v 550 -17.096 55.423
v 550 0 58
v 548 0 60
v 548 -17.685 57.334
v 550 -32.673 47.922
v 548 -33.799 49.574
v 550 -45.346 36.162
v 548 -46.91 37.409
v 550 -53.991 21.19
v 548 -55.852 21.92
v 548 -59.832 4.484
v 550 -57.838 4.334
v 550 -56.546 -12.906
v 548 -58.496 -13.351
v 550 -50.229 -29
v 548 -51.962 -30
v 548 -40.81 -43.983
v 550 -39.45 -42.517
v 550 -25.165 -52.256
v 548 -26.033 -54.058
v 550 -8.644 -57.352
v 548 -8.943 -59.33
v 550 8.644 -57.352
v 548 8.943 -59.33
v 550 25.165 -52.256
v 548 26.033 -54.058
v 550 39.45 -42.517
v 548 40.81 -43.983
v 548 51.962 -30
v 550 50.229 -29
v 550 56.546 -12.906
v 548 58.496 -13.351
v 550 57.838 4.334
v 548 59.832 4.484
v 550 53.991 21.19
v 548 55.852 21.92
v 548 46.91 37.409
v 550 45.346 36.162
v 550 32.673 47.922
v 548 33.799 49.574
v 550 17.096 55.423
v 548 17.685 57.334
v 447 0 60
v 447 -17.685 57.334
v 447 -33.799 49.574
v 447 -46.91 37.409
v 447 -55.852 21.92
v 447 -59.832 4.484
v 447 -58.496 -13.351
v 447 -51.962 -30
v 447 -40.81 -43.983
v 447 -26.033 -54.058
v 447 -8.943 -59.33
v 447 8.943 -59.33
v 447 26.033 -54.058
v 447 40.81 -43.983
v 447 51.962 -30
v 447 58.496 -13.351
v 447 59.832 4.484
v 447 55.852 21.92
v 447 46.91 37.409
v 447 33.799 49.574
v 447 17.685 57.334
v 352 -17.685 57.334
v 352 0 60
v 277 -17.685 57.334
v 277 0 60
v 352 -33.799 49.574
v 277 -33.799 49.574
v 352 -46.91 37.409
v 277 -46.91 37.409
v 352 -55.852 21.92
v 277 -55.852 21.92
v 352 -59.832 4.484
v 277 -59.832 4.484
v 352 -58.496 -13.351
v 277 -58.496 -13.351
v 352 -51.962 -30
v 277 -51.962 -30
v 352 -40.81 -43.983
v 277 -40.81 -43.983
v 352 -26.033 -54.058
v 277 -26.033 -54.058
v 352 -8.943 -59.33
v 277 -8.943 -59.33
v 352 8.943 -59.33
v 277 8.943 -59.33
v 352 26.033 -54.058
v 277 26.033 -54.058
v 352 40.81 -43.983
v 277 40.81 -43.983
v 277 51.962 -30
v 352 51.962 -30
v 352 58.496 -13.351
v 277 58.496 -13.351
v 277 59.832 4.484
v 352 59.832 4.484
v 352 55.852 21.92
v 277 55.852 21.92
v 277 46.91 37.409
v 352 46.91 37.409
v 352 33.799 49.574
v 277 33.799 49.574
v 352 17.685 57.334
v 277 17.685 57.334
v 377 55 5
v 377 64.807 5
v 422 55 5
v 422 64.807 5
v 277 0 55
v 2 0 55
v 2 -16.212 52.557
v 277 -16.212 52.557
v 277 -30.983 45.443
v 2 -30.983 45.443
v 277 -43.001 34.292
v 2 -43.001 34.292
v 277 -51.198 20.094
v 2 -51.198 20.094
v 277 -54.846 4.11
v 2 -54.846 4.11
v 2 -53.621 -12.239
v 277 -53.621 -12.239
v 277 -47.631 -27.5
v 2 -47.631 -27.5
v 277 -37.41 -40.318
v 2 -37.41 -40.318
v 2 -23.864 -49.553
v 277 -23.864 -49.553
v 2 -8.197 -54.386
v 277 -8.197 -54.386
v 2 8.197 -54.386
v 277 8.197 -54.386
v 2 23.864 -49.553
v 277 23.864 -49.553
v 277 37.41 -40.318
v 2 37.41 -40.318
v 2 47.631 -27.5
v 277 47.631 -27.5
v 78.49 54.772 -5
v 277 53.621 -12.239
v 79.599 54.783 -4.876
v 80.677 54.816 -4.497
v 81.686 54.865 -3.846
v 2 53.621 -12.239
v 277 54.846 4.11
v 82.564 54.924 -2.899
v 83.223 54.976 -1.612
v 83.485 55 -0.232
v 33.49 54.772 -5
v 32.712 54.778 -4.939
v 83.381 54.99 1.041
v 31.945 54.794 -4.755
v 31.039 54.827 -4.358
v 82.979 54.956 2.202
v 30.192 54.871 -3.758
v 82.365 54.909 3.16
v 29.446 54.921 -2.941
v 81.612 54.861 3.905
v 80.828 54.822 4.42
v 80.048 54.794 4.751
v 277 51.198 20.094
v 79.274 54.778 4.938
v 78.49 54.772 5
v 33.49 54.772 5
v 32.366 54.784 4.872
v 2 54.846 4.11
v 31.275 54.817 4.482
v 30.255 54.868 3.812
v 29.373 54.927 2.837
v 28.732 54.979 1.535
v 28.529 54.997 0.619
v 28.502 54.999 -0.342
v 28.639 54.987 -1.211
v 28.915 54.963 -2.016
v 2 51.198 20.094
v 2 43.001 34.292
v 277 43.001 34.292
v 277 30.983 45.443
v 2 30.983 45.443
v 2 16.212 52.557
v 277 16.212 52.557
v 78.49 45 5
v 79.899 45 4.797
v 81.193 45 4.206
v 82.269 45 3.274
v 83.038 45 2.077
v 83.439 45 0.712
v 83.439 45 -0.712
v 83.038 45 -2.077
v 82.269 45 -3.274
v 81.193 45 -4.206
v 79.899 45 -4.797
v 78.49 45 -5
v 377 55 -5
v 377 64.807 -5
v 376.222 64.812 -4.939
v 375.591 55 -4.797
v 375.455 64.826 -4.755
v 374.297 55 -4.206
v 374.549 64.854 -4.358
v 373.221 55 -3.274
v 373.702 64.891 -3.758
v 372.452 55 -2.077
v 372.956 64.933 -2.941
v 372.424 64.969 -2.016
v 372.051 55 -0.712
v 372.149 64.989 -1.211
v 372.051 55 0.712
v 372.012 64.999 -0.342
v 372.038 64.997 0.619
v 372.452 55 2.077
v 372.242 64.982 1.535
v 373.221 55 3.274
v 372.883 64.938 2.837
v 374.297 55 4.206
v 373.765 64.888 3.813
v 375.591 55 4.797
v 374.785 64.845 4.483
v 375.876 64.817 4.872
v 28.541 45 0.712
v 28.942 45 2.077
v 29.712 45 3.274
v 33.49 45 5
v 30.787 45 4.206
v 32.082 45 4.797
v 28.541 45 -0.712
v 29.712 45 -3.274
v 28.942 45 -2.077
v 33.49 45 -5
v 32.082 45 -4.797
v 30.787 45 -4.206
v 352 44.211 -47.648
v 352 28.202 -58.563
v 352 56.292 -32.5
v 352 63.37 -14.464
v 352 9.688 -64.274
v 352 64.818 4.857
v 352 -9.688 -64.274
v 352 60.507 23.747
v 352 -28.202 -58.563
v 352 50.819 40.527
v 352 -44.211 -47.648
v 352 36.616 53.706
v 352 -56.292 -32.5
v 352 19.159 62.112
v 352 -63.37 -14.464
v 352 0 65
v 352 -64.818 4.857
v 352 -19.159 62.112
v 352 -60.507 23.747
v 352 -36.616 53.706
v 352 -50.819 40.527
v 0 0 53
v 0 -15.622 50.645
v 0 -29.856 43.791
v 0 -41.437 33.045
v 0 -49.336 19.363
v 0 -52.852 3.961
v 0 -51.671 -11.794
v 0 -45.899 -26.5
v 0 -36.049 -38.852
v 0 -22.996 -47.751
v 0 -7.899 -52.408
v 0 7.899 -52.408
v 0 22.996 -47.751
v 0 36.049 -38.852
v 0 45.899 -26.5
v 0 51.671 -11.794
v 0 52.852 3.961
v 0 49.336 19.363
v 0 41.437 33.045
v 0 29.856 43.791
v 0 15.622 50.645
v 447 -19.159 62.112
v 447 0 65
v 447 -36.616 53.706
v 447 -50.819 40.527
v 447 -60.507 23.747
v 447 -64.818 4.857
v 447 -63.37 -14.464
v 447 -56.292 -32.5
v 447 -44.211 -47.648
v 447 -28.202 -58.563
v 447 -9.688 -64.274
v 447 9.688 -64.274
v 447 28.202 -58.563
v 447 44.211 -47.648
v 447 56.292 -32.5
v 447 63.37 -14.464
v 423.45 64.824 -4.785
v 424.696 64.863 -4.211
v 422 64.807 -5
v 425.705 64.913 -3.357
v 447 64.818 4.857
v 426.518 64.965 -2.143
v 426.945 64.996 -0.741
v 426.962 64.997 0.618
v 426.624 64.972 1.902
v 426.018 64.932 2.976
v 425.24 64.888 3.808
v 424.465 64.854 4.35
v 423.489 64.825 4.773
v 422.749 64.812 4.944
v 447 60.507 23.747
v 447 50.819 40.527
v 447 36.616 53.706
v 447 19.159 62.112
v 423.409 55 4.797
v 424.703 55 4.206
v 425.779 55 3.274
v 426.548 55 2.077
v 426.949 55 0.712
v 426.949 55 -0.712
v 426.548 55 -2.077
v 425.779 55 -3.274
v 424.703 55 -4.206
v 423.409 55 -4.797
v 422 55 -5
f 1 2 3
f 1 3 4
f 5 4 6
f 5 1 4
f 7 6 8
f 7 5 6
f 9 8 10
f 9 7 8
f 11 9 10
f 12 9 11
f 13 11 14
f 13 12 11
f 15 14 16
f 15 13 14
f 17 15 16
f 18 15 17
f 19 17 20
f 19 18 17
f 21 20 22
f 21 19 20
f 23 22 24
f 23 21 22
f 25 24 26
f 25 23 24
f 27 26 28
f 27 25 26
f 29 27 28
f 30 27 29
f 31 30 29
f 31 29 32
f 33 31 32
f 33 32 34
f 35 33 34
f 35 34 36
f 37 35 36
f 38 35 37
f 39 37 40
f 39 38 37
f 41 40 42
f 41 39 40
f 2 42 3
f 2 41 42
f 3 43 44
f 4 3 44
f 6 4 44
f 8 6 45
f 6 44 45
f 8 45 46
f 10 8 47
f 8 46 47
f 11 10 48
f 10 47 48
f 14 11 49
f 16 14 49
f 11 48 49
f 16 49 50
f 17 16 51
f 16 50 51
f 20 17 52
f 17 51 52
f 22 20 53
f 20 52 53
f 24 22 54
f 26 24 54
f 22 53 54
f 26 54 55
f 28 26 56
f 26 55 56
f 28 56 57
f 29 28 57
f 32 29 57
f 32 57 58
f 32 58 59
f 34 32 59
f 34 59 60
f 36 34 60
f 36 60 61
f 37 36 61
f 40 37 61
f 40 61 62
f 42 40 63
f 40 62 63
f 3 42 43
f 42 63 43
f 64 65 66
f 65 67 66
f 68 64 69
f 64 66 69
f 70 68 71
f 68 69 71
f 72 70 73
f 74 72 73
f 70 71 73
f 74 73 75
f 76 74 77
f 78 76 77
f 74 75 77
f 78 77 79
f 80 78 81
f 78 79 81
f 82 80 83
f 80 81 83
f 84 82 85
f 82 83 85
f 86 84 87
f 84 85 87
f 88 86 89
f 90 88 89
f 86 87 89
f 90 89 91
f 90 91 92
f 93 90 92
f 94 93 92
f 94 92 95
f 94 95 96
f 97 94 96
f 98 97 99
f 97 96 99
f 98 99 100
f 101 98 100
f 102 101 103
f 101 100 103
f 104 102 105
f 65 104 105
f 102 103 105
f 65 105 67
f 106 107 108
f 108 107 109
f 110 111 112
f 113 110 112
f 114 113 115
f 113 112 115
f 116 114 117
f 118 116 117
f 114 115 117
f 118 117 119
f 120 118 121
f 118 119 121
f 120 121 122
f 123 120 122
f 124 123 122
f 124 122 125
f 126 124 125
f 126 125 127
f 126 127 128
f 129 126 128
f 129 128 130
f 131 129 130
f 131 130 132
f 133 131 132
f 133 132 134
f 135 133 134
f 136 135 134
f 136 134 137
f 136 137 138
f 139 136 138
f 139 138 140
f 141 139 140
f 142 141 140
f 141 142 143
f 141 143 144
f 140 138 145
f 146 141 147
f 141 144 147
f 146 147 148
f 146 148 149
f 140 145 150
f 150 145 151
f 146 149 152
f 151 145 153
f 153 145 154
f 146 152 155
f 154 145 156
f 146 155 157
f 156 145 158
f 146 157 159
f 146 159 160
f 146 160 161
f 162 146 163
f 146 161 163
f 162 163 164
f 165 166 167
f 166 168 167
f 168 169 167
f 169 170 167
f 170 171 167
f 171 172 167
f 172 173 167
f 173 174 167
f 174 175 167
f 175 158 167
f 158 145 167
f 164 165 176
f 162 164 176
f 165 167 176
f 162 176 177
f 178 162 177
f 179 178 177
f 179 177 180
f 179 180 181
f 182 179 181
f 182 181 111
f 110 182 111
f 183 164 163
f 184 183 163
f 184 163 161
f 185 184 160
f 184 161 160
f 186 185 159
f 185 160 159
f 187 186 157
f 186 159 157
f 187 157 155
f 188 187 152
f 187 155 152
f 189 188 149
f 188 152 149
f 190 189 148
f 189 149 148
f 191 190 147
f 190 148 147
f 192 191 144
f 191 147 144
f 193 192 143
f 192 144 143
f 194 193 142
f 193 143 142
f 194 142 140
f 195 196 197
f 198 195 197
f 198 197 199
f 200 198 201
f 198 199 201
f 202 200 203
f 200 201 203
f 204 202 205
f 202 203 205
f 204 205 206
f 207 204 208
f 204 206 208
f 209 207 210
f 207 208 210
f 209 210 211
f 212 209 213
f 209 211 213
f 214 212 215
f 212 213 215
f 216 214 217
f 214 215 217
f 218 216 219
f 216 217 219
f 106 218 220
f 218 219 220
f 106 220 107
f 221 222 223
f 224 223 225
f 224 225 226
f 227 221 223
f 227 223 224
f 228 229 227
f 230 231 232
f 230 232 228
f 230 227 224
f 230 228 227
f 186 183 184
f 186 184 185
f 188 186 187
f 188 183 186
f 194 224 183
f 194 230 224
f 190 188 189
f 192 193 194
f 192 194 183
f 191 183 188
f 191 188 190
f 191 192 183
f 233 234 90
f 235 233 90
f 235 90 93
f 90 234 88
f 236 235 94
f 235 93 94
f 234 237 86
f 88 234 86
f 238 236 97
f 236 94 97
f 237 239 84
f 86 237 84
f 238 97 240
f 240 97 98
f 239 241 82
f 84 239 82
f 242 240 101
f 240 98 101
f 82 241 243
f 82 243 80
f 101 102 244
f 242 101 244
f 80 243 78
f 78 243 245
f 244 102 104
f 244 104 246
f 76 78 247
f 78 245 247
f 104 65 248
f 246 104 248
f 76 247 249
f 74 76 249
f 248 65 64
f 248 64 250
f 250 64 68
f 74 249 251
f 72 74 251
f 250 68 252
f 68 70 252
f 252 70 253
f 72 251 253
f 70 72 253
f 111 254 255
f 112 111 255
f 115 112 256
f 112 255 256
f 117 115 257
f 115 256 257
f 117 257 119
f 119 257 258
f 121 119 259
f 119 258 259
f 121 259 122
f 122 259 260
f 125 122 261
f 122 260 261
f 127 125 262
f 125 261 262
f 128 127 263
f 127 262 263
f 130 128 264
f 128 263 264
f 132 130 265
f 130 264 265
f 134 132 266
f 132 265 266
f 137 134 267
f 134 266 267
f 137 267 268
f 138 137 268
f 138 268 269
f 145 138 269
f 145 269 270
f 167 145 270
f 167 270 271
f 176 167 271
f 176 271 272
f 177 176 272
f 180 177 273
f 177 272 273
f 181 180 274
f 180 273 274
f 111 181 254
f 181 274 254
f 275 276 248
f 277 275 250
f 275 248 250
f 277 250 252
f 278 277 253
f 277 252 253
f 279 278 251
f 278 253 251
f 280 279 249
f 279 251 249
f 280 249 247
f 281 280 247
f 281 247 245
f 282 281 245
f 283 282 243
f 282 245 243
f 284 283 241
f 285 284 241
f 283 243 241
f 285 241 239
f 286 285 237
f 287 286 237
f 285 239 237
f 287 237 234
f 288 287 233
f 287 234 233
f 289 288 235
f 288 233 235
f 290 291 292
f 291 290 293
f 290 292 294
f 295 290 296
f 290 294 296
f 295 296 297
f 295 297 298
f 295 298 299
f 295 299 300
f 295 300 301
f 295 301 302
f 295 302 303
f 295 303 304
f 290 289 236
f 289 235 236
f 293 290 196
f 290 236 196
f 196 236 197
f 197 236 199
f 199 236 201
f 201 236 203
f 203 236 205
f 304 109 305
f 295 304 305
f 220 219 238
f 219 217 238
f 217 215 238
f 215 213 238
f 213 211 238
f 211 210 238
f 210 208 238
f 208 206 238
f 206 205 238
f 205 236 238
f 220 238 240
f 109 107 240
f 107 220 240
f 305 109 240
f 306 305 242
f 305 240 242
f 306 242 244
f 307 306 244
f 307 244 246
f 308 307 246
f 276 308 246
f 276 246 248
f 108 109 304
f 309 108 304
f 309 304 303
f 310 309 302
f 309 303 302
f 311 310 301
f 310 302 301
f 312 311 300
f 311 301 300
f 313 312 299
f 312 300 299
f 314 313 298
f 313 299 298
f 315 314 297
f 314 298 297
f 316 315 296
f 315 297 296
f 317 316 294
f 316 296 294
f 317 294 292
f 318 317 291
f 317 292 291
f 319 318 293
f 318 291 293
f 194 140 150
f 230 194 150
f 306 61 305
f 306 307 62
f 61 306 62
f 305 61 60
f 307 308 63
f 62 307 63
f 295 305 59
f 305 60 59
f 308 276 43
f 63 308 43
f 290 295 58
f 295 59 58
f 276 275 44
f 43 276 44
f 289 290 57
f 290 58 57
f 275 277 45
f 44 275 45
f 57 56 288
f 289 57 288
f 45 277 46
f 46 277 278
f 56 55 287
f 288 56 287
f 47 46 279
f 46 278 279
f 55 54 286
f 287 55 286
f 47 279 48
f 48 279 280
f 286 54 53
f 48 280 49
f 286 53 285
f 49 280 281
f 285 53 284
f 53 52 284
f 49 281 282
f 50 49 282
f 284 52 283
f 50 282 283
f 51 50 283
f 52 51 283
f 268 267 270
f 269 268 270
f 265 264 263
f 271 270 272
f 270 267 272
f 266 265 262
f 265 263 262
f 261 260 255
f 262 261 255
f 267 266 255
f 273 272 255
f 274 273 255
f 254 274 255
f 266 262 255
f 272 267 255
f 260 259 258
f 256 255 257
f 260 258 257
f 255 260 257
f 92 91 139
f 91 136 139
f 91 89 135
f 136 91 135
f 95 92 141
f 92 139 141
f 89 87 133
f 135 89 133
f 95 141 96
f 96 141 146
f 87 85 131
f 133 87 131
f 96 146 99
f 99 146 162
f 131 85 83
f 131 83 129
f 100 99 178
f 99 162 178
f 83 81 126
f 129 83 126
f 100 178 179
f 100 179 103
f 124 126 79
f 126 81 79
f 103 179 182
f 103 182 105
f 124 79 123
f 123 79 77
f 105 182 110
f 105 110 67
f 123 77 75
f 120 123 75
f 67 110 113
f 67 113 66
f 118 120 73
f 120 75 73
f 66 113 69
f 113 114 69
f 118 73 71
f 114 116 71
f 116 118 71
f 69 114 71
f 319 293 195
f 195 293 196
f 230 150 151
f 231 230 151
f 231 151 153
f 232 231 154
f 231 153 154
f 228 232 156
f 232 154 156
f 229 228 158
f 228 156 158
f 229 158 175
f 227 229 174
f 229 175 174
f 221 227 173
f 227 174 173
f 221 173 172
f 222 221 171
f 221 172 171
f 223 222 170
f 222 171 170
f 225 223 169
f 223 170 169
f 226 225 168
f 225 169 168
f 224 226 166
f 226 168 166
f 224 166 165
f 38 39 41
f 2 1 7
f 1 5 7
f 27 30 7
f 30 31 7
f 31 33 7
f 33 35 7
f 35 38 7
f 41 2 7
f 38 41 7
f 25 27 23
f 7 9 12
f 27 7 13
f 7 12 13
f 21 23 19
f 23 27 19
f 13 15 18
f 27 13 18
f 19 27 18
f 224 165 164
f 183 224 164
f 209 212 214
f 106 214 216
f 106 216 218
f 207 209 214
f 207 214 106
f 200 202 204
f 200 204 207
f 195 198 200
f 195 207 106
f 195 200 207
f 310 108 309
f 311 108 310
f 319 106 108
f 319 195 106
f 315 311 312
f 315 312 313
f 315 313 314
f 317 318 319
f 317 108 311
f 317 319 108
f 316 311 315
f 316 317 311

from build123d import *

# Parameters (mm, degrees)
CHAFL_N1_SIZE         = 2
CHAFL_N2_SIZE         = 2
CORTAR_EXTRUIR1_DEPTH = 10
CORTAR_EXTRUIR2_DEPTH = 10


with BuildPart() as part:
    # Croquis1 → Revolución2 (revolve)
    with BuildSketch(Plane(origin=(0, 0, 0), x_dir=(1, 0, 0), z_dir=(0, 1, 0)), mode=Mode.PRIVATE) as revoluci_n2_sk:
        Polygon((0, 0), (550, 0), (550, 60), (447, 60), (447, 65), (352, 65), (352, 60), (277, 60), (277, 55), (0, 55), align=None)
    revolve(revoluci_n2_sk.sketch.rotate(Axis((0, 0, 0), (1, 0, 0)), 180), axis=Axis((0, 0, 0), (1, 0, 0)))

    # Chaflán1
    chafl_n1_edges = [part.edges().sort_by_distance(p)[0] for p in [
        (0, 0, -55),
    ]]
    chamfer(chafl_n1_edges, length=CHAFL_N1_SIZE)

    # Chaflán2
    chafl_n2_edges = [part.edges().sort_by_distance(p)[0] for p in [
        (550, 0, -60),
    ]]
    chamfer(chafl_n2_edges, length=CHAFL_N2_SIZE)

    # Croquis2 → Cortar-Extruir1 (cut)
    with BuildSketch(Plane(origin=(0, 65, 0), x_dir=(1, 0, 0), z_dir=(0, 1, 0))):
        with BuildLine():
            Line((377, -5), (422, -5))
            ThreePointArc((422, -5), (427, 0), (422, 5))
            Line((422, 5), (377, 5))
            ThreePointArc((377, 5), (372, 0), (377, -5))
        make_face()
    extrude(amount=-CORTAR_EXTRUIR1_DEPTH, mode=Mode.SUBTRACT)

    # Croquis3 → Cortar-Extruir2 (cut)
    with BuildSketch(Plane(origin=(0, 55, 0), x_dir=(1, 0, 0), z_dir=(0, 1, 0))):
        with BuildLine():
            Line((33.490249976, -5), (78.490249976, -5))
            ThreePointArc((78.490249976, -5), (83.490249976, 0), (78.490249976, 5))
            Line((78.490249976, 5), (33.490249976, 5))
            ThreePointArc((33.490249976, 5), (28.490249976, 0), (33.490249976, -5))
        make_face()
    extrude(amount=-CORTAR_EXTRUIR2_DEPTH, mode=Mode.SUBTRACT)


solid = part.part
